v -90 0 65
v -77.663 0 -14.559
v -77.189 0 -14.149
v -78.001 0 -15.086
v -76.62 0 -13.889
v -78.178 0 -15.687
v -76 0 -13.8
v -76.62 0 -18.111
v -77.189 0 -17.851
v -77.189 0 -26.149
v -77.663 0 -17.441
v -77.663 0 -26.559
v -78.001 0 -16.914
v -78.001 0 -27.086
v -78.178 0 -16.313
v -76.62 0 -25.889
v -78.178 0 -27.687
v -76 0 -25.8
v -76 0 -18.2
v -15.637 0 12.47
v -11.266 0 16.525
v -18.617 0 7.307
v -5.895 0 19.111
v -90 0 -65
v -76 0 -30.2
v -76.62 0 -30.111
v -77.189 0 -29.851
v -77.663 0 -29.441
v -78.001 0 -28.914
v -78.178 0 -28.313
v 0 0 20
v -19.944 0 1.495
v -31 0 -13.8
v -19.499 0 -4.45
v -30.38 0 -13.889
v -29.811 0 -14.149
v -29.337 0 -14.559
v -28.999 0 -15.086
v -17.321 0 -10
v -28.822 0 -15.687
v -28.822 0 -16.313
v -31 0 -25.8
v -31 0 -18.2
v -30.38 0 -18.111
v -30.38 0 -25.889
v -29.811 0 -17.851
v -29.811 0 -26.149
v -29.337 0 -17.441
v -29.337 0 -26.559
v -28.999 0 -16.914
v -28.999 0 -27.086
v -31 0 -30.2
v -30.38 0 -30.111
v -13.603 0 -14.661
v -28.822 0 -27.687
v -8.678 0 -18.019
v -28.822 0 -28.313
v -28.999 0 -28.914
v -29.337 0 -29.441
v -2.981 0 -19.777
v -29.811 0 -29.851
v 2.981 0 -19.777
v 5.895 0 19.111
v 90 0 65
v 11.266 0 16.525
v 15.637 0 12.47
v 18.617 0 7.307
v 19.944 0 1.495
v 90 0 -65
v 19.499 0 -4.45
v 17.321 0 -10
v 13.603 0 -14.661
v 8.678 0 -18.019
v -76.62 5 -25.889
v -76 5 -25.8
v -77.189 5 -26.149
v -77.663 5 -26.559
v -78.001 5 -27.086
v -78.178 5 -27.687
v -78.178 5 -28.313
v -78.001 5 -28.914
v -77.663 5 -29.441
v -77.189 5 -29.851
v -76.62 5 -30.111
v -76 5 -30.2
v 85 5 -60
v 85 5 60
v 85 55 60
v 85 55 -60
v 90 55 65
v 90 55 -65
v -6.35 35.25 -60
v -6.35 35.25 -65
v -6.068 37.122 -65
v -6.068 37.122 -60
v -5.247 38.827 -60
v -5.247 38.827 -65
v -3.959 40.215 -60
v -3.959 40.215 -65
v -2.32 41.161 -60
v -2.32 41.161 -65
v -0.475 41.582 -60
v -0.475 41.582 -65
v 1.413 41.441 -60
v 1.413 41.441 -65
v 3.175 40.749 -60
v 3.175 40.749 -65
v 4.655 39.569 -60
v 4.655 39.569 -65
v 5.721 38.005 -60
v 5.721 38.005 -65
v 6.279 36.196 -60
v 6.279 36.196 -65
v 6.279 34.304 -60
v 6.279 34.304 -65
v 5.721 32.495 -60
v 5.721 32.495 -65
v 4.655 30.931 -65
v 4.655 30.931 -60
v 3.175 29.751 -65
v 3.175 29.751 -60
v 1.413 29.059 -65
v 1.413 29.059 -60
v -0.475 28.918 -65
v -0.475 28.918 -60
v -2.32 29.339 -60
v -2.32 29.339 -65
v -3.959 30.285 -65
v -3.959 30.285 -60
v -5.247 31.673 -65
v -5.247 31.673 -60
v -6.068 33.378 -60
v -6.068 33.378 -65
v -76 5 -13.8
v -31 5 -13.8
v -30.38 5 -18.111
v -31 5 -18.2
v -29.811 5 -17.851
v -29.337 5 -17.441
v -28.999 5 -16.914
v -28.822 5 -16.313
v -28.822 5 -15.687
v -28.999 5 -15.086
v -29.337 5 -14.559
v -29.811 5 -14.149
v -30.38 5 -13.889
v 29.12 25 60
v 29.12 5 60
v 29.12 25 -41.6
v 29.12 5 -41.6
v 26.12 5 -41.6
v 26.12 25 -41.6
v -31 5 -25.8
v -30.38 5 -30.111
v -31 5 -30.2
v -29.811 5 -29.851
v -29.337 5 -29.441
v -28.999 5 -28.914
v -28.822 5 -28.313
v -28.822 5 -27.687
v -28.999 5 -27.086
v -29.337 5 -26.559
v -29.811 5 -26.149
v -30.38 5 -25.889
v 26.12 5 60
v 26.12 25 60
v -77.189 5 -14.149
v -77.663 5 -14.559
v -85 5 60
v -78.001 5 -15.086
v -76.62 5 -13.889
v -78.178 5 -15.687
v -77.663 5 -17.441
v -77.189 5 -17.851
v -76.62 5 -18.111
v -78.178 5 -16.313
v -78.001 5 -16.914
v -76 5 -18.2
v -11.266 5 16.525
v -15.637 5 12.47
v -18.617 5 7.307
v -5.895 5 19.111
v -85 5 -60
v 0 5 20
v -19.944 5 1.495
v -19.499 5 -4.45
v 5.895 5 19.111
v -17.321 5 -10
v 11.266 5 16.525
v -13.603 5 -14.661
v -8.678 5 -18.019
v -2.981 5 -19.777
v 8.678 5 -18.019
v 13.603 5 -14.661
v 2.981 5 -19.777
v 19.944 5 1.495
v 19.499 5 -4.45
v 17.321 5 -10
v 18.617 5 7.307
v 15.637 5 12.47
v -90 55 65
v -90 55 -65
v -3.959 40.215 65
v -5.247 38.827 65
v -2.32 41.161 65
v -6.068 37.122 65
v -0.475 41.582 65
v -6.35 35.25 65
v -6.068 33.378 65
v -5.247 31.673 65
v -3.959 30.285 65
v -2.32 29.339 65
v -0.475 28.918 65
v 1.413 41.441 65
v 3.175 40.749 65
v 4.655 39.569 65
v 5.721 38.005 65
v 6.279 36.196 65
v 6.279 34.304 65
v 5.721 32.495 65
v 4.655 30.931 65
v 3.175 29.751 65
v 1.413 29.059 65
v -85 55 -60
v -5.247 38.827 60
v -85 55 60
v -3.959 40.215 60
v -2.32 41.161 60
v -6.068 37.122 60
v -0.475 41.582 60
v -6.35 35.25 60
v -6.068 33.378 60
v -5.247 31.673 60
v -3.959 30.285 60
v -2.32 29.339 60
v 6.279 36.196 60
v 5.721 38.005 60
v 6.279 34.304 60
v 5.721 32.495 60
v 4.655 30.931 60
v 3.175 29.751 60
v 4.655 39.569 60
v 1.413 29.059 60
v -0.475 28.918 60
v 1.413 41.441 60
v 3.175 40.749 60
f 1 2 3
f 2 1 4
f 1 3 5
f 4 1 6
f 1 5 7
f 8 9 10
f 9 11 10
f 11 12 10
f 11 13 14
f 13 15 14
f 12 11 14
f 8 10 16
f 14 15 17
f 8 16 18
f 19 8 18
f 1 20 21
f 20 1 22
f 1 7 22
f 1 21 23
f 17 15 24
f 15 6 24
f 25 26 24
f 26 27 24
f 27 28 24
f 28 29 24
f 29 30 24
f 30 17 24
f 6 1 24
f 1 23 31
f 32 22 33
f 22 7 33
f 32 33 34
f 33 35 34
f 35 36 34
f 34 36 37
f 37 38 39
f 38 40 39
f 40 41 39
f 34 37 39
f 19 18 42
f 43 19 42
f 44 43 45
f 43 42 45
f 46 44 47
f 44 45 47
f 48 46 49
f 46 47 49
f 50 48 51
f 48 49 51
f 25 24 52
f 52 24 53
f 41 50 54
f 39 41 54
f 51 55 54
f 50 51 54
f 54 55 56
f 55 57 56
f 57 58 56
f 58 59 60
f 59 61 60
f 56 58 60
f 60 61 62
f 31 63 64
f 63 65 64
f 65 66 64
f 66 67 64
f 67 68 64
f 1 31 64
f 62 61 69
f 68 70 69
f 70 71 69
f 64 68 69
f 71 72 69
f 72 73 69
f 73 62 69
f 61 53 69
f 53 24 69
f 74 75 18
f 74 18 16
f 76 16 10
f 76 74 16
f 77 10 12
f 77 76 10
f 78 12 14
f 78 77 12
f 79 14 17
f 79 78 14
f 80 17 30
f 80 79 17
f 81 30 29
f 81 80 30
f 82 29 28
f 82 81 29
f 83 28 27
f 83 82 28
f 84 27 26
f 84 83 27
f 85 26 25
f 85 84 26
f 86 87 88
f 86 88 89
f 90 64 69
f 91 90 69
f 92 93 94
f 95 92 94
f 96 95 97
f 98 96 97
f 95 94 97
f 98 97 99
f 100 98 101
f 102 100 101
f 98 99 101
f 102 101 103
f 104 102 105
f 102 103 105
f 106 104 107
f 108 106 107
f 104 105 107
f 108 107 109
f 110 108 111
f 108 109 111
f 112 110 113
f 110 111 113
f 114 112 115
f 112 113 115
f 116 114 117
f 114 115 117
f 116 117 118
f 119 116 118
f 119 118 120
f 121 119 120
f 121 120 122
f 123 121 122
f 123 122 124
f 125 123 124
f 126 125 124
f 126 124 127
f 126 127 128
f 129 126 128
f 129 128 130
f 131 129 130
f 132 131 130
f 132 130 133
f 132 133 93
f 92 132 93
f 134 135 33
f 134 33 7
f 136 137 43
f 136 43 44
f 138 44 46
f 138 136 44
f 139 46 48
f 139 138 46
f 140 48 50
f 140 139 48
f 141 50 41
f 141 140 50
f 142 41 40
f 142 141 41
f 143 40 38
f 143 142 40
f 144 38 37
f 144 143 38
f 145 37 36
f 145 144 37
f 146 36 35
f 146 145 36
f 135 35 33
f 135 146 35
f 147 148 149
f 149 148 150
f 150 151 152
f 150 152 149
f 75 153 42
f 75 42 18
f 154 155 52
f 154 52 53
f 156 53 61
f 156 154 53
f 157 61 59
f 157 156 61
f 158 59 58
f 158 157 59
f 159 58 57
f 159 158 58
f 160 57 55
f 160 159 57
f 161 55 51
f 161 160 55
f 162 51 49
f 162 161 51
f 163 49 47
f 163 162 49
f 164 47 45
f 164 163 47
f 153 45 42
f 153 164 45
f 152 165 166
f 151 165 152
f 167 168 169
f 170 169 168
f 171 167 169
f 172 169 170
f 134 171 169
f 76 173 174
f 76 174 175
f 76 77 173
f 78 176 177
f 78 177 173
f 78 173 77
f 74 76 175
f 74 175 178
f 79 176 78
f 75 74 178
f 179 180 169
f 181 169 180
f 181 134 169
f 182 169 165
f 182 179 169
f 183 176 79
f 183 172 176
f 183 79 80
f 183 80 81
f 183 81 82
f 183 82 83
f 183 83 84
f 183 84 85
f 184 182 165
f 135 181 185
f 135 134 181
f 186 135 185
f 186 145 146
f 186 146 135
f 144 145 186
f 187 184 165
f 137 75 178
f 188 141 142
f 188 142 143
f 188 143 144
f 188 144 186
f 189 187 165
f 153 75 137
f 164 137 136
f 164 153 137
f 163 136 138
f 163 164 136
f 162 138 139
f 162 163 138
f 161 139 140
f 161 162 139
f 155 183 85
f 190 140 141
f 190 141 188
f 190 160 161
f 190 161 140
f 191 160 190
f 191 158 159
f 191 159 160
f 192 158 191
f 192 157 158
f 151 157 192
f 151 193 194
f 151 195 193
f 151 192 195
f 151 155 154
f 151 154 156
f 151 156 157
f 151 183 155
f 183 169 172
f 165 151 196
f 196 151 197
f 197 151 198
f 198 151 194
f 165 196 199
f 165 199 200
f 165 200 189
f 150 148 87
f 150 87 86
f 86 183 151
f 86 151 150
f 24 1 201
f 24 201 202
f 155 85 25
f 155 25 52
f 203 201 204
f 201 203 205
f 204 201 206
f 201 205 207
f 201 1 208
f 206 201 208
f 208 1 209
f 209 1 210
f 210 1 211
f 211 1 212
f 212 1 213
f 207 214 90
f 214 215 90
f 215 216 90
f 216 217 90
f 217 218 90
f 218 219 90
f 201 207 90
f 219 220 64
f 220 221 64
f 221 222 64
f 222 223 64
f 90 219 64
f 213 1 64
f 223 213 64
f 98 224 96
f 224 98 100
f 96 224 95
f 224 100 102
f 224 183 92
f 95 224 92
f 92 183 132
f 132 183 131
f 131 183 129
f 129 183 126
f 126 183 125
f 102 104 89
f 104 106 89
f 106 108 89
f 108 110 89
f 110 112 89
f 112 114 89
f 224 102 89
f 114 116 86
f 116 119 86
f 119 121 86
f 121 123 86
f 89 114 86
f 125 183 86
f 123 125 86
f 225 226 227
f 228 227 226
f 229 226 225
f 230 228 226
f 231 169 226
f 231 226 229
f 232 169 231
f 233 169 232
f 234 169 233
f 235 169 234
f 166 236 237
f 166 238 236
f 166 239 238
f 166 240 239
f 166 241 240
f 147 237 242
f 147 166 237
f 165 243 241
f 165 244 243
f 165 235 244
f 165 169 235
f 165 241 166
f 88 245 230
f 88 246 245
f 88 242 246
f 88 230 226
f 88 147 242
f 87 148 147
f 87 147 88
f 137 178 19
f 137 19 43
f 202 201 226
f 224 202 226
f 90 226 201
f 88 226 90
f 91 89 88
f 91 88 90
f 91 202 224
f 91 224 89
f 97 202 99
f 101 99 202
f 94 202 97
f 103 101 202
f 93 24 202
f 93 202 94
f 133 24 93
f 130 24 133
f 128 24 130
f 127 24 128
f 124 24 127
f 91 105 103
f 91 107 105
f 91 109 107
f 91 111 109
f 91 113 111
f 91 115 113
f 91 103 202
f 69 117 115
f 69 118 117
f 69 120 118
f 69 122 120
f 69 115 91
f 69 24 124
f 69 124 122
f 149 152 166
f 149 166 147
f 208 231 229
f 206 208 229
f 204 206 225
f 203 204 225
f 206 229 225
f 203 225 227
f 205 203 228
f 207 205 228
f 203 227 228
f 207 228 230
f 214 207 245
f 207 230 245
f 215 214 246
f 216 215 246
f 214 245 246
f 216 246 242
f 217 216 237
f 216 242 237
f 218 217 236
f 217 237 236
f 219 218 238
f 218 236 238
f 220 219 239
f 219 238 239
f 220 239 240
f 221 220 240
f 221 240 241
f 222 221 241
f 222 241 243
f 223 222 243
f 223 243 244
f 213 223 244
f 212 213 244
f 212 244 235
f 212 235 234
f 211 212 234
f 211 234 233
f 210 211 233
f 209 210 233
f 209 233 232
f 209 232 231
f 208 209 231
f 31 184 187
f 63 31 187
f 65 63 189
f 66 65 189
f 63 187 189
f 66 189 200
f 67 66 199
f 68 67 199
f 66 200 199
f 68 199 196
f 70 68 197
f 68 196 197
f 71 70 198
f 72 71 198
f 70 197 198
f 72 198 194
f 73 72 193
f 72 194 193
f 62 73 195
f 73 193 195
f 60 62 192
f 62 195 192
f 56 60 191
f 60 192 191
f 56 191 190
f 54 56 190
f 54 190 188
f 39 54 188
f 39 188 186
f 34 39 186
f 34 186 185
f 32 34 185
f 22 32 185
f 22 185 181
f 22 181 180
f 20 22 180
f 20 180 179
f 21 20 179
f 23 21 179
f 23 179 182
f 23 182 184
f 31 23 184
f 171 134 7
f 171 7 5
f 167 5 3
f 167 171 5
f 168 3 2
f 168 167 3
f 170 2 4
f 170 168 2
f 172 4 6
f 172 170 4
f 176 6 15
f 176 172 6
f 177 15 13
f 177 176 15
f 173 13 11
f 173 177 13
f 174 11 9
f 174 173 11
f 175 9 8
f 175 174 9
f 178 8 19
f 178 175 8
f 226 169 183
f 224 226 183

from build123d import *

# Parameters (mm, degrees)
ESQUISSE1_W             = 180
ESQUISSE1_H             = 130
ESQUISSE1_W_2           = 170
ESQUISSE1_H_2           = 120
BOSS_EXTRU_2_DEPTH      = 55
ESQUISSE2_W             = 170
ESQUISSE2_H             = 120
BOSS_EXTRU_3_DEPTH      = 5
ESQUISSE3_R             = 20
ENL_V_MAT_EXTRU_1_DEPTH = 122.757956619
ENL_V_MAT_EXTRU_2_DEPTH = 122.757956619
ENL_V_MAT_EXTRU_3_REACH = 169.407
ESQUISSE5_R             = 6.35
ESQUISSE6_W             = 3
ESQUISSE6_H             = 101.6
BOSS_EXTRU_4_DEPTH      = 20


with BuildPart() as part:
    # Esquisse1 → Boss.-Extru.2 (new body)
    with BuildSketch(Plane(origin=(0, 0, 0), x_dir=(1, 0, 0), z_dir=(0, 1, 0))):
        Rectangle(ESQUISSE1_W, ESQUISSE1_H)
        Rectangle(ESQUISSE1_W_2, ESQUISSE1_H_2, mode=Mode.SUBTRACT)
    extrude(amount=BOSS_EXTRU_2_DEPTH)

    # Esquisse2 → Boss.-Extru.3 (add)
    with BuildSketch(Plane(origin=(0, 0, 0), x_dir=(1, 0, 0), z_dir=(0, 1, 0))):
        Rectangle(ESQUISSE2_W, ESQUISSE2_H)
    extrude(amount=BOSS_EXTRU_3_DEPTH)

    # Esquisse3 → Enlèv. mat.-Extru.1 (cut, through all)
    with BuildSketch(Plane(origin=(0, 5, 0), x_dir=(1, 0, 0), z_dir=(0, 1, 0))):
        with Locations(Location((0, 0, 0), (0, 0, 270))):
            Circle(ESQUISSE3_R)
    extrude(amount=-ENL_V_MAT_EXTRU_1_DEPTH, mode=Mode.SUBTRACT)

    # Esquisse4 → Enlèv. mat.-Extru.2 (cut, through all)
    with BuildSketch(Plane(origin=(0, 5, 0), x_dir=(1, 0, 0), z_dir=(0, 1, 0))):
        with BuildLine():
            Line((-76, 30.2), (-31, 30.2))
            ThreePointArc((-31, 30.2), (-28.8, 28), (-31, 25.8))
            Line((-31, 25.8), (-76, 25.8))
            ThreePointArc((-76, 25.8), (-78.2, 28), (-76, 30.2))
        make_face()
        with BuildLine():
            Line((-76, 18.2), (-31, 18.2))
            ThreePointArc((-31, 18.2), (-28.8, 16), (-31, 13.8))
            Line((-31, 13.8), (-76, 13.8))
            ThreePointArc((-76, 13.8), (-78.2, 16), (-76, 18.2))
        make_face()
    extrude(amount=-ENL_V_MAT_EXTRU_2_DEPTH, mode=Mode.SUBTRACT)

    # Enlèv. mat.-Extru.3: up to this face of the body (flat: up to its plane)
    enl_v_mat_extru_3_end = Plane(part.part.faces().sort_by_distance((0, 27.5, 65))[0])
    # Esquisse5 → Enlèv. mat.-Extru.3 (cut, up to the picked face)
    with BuildSketch(Plane(origin=(0, 0, -65), x_dir=(-1, 0, 0), z_dir=(0, 0, -1)), mode=Mode.PRIVATE) as enl_v_mat_extru_3_sk1:
        with Locations((0, 35.25)):
            Circle(ESQUISSE5_R)
    enl_v_mat_extru_3_tool1 = split(extrude(enl_v_mat_extru_3_sk1.sketch, amount=-ENL_V_MAT_EXTRU_3_REACH, mode=Mode.PRIVATE), bisect_by=enl_v_mat_extru_3_end, keep=Keep.BOTH, mode=Mode.PRIVATE)
    add(enl_v_mat_extru_3_tool1.solids().sort_by(Axis((0, 35.25, -65), (0, 0, 1)))[0], mode=Mode.SUBTRACT)

    # Esquisse6 → Boss.-Extru.4 (add)
    with BuildSketch(Plane(origin=(0, 5, 0), x_dir=(1, 0, 0), z_dir=(0, 1, 0))):
        with Locations((27.62, -9.2)):
            Rectangle(ESQUISSE6_W, ESQUISSE6_H)
    extrude(amount=BOSS_EXTRU_4_DEPTH)


solid = part.part
